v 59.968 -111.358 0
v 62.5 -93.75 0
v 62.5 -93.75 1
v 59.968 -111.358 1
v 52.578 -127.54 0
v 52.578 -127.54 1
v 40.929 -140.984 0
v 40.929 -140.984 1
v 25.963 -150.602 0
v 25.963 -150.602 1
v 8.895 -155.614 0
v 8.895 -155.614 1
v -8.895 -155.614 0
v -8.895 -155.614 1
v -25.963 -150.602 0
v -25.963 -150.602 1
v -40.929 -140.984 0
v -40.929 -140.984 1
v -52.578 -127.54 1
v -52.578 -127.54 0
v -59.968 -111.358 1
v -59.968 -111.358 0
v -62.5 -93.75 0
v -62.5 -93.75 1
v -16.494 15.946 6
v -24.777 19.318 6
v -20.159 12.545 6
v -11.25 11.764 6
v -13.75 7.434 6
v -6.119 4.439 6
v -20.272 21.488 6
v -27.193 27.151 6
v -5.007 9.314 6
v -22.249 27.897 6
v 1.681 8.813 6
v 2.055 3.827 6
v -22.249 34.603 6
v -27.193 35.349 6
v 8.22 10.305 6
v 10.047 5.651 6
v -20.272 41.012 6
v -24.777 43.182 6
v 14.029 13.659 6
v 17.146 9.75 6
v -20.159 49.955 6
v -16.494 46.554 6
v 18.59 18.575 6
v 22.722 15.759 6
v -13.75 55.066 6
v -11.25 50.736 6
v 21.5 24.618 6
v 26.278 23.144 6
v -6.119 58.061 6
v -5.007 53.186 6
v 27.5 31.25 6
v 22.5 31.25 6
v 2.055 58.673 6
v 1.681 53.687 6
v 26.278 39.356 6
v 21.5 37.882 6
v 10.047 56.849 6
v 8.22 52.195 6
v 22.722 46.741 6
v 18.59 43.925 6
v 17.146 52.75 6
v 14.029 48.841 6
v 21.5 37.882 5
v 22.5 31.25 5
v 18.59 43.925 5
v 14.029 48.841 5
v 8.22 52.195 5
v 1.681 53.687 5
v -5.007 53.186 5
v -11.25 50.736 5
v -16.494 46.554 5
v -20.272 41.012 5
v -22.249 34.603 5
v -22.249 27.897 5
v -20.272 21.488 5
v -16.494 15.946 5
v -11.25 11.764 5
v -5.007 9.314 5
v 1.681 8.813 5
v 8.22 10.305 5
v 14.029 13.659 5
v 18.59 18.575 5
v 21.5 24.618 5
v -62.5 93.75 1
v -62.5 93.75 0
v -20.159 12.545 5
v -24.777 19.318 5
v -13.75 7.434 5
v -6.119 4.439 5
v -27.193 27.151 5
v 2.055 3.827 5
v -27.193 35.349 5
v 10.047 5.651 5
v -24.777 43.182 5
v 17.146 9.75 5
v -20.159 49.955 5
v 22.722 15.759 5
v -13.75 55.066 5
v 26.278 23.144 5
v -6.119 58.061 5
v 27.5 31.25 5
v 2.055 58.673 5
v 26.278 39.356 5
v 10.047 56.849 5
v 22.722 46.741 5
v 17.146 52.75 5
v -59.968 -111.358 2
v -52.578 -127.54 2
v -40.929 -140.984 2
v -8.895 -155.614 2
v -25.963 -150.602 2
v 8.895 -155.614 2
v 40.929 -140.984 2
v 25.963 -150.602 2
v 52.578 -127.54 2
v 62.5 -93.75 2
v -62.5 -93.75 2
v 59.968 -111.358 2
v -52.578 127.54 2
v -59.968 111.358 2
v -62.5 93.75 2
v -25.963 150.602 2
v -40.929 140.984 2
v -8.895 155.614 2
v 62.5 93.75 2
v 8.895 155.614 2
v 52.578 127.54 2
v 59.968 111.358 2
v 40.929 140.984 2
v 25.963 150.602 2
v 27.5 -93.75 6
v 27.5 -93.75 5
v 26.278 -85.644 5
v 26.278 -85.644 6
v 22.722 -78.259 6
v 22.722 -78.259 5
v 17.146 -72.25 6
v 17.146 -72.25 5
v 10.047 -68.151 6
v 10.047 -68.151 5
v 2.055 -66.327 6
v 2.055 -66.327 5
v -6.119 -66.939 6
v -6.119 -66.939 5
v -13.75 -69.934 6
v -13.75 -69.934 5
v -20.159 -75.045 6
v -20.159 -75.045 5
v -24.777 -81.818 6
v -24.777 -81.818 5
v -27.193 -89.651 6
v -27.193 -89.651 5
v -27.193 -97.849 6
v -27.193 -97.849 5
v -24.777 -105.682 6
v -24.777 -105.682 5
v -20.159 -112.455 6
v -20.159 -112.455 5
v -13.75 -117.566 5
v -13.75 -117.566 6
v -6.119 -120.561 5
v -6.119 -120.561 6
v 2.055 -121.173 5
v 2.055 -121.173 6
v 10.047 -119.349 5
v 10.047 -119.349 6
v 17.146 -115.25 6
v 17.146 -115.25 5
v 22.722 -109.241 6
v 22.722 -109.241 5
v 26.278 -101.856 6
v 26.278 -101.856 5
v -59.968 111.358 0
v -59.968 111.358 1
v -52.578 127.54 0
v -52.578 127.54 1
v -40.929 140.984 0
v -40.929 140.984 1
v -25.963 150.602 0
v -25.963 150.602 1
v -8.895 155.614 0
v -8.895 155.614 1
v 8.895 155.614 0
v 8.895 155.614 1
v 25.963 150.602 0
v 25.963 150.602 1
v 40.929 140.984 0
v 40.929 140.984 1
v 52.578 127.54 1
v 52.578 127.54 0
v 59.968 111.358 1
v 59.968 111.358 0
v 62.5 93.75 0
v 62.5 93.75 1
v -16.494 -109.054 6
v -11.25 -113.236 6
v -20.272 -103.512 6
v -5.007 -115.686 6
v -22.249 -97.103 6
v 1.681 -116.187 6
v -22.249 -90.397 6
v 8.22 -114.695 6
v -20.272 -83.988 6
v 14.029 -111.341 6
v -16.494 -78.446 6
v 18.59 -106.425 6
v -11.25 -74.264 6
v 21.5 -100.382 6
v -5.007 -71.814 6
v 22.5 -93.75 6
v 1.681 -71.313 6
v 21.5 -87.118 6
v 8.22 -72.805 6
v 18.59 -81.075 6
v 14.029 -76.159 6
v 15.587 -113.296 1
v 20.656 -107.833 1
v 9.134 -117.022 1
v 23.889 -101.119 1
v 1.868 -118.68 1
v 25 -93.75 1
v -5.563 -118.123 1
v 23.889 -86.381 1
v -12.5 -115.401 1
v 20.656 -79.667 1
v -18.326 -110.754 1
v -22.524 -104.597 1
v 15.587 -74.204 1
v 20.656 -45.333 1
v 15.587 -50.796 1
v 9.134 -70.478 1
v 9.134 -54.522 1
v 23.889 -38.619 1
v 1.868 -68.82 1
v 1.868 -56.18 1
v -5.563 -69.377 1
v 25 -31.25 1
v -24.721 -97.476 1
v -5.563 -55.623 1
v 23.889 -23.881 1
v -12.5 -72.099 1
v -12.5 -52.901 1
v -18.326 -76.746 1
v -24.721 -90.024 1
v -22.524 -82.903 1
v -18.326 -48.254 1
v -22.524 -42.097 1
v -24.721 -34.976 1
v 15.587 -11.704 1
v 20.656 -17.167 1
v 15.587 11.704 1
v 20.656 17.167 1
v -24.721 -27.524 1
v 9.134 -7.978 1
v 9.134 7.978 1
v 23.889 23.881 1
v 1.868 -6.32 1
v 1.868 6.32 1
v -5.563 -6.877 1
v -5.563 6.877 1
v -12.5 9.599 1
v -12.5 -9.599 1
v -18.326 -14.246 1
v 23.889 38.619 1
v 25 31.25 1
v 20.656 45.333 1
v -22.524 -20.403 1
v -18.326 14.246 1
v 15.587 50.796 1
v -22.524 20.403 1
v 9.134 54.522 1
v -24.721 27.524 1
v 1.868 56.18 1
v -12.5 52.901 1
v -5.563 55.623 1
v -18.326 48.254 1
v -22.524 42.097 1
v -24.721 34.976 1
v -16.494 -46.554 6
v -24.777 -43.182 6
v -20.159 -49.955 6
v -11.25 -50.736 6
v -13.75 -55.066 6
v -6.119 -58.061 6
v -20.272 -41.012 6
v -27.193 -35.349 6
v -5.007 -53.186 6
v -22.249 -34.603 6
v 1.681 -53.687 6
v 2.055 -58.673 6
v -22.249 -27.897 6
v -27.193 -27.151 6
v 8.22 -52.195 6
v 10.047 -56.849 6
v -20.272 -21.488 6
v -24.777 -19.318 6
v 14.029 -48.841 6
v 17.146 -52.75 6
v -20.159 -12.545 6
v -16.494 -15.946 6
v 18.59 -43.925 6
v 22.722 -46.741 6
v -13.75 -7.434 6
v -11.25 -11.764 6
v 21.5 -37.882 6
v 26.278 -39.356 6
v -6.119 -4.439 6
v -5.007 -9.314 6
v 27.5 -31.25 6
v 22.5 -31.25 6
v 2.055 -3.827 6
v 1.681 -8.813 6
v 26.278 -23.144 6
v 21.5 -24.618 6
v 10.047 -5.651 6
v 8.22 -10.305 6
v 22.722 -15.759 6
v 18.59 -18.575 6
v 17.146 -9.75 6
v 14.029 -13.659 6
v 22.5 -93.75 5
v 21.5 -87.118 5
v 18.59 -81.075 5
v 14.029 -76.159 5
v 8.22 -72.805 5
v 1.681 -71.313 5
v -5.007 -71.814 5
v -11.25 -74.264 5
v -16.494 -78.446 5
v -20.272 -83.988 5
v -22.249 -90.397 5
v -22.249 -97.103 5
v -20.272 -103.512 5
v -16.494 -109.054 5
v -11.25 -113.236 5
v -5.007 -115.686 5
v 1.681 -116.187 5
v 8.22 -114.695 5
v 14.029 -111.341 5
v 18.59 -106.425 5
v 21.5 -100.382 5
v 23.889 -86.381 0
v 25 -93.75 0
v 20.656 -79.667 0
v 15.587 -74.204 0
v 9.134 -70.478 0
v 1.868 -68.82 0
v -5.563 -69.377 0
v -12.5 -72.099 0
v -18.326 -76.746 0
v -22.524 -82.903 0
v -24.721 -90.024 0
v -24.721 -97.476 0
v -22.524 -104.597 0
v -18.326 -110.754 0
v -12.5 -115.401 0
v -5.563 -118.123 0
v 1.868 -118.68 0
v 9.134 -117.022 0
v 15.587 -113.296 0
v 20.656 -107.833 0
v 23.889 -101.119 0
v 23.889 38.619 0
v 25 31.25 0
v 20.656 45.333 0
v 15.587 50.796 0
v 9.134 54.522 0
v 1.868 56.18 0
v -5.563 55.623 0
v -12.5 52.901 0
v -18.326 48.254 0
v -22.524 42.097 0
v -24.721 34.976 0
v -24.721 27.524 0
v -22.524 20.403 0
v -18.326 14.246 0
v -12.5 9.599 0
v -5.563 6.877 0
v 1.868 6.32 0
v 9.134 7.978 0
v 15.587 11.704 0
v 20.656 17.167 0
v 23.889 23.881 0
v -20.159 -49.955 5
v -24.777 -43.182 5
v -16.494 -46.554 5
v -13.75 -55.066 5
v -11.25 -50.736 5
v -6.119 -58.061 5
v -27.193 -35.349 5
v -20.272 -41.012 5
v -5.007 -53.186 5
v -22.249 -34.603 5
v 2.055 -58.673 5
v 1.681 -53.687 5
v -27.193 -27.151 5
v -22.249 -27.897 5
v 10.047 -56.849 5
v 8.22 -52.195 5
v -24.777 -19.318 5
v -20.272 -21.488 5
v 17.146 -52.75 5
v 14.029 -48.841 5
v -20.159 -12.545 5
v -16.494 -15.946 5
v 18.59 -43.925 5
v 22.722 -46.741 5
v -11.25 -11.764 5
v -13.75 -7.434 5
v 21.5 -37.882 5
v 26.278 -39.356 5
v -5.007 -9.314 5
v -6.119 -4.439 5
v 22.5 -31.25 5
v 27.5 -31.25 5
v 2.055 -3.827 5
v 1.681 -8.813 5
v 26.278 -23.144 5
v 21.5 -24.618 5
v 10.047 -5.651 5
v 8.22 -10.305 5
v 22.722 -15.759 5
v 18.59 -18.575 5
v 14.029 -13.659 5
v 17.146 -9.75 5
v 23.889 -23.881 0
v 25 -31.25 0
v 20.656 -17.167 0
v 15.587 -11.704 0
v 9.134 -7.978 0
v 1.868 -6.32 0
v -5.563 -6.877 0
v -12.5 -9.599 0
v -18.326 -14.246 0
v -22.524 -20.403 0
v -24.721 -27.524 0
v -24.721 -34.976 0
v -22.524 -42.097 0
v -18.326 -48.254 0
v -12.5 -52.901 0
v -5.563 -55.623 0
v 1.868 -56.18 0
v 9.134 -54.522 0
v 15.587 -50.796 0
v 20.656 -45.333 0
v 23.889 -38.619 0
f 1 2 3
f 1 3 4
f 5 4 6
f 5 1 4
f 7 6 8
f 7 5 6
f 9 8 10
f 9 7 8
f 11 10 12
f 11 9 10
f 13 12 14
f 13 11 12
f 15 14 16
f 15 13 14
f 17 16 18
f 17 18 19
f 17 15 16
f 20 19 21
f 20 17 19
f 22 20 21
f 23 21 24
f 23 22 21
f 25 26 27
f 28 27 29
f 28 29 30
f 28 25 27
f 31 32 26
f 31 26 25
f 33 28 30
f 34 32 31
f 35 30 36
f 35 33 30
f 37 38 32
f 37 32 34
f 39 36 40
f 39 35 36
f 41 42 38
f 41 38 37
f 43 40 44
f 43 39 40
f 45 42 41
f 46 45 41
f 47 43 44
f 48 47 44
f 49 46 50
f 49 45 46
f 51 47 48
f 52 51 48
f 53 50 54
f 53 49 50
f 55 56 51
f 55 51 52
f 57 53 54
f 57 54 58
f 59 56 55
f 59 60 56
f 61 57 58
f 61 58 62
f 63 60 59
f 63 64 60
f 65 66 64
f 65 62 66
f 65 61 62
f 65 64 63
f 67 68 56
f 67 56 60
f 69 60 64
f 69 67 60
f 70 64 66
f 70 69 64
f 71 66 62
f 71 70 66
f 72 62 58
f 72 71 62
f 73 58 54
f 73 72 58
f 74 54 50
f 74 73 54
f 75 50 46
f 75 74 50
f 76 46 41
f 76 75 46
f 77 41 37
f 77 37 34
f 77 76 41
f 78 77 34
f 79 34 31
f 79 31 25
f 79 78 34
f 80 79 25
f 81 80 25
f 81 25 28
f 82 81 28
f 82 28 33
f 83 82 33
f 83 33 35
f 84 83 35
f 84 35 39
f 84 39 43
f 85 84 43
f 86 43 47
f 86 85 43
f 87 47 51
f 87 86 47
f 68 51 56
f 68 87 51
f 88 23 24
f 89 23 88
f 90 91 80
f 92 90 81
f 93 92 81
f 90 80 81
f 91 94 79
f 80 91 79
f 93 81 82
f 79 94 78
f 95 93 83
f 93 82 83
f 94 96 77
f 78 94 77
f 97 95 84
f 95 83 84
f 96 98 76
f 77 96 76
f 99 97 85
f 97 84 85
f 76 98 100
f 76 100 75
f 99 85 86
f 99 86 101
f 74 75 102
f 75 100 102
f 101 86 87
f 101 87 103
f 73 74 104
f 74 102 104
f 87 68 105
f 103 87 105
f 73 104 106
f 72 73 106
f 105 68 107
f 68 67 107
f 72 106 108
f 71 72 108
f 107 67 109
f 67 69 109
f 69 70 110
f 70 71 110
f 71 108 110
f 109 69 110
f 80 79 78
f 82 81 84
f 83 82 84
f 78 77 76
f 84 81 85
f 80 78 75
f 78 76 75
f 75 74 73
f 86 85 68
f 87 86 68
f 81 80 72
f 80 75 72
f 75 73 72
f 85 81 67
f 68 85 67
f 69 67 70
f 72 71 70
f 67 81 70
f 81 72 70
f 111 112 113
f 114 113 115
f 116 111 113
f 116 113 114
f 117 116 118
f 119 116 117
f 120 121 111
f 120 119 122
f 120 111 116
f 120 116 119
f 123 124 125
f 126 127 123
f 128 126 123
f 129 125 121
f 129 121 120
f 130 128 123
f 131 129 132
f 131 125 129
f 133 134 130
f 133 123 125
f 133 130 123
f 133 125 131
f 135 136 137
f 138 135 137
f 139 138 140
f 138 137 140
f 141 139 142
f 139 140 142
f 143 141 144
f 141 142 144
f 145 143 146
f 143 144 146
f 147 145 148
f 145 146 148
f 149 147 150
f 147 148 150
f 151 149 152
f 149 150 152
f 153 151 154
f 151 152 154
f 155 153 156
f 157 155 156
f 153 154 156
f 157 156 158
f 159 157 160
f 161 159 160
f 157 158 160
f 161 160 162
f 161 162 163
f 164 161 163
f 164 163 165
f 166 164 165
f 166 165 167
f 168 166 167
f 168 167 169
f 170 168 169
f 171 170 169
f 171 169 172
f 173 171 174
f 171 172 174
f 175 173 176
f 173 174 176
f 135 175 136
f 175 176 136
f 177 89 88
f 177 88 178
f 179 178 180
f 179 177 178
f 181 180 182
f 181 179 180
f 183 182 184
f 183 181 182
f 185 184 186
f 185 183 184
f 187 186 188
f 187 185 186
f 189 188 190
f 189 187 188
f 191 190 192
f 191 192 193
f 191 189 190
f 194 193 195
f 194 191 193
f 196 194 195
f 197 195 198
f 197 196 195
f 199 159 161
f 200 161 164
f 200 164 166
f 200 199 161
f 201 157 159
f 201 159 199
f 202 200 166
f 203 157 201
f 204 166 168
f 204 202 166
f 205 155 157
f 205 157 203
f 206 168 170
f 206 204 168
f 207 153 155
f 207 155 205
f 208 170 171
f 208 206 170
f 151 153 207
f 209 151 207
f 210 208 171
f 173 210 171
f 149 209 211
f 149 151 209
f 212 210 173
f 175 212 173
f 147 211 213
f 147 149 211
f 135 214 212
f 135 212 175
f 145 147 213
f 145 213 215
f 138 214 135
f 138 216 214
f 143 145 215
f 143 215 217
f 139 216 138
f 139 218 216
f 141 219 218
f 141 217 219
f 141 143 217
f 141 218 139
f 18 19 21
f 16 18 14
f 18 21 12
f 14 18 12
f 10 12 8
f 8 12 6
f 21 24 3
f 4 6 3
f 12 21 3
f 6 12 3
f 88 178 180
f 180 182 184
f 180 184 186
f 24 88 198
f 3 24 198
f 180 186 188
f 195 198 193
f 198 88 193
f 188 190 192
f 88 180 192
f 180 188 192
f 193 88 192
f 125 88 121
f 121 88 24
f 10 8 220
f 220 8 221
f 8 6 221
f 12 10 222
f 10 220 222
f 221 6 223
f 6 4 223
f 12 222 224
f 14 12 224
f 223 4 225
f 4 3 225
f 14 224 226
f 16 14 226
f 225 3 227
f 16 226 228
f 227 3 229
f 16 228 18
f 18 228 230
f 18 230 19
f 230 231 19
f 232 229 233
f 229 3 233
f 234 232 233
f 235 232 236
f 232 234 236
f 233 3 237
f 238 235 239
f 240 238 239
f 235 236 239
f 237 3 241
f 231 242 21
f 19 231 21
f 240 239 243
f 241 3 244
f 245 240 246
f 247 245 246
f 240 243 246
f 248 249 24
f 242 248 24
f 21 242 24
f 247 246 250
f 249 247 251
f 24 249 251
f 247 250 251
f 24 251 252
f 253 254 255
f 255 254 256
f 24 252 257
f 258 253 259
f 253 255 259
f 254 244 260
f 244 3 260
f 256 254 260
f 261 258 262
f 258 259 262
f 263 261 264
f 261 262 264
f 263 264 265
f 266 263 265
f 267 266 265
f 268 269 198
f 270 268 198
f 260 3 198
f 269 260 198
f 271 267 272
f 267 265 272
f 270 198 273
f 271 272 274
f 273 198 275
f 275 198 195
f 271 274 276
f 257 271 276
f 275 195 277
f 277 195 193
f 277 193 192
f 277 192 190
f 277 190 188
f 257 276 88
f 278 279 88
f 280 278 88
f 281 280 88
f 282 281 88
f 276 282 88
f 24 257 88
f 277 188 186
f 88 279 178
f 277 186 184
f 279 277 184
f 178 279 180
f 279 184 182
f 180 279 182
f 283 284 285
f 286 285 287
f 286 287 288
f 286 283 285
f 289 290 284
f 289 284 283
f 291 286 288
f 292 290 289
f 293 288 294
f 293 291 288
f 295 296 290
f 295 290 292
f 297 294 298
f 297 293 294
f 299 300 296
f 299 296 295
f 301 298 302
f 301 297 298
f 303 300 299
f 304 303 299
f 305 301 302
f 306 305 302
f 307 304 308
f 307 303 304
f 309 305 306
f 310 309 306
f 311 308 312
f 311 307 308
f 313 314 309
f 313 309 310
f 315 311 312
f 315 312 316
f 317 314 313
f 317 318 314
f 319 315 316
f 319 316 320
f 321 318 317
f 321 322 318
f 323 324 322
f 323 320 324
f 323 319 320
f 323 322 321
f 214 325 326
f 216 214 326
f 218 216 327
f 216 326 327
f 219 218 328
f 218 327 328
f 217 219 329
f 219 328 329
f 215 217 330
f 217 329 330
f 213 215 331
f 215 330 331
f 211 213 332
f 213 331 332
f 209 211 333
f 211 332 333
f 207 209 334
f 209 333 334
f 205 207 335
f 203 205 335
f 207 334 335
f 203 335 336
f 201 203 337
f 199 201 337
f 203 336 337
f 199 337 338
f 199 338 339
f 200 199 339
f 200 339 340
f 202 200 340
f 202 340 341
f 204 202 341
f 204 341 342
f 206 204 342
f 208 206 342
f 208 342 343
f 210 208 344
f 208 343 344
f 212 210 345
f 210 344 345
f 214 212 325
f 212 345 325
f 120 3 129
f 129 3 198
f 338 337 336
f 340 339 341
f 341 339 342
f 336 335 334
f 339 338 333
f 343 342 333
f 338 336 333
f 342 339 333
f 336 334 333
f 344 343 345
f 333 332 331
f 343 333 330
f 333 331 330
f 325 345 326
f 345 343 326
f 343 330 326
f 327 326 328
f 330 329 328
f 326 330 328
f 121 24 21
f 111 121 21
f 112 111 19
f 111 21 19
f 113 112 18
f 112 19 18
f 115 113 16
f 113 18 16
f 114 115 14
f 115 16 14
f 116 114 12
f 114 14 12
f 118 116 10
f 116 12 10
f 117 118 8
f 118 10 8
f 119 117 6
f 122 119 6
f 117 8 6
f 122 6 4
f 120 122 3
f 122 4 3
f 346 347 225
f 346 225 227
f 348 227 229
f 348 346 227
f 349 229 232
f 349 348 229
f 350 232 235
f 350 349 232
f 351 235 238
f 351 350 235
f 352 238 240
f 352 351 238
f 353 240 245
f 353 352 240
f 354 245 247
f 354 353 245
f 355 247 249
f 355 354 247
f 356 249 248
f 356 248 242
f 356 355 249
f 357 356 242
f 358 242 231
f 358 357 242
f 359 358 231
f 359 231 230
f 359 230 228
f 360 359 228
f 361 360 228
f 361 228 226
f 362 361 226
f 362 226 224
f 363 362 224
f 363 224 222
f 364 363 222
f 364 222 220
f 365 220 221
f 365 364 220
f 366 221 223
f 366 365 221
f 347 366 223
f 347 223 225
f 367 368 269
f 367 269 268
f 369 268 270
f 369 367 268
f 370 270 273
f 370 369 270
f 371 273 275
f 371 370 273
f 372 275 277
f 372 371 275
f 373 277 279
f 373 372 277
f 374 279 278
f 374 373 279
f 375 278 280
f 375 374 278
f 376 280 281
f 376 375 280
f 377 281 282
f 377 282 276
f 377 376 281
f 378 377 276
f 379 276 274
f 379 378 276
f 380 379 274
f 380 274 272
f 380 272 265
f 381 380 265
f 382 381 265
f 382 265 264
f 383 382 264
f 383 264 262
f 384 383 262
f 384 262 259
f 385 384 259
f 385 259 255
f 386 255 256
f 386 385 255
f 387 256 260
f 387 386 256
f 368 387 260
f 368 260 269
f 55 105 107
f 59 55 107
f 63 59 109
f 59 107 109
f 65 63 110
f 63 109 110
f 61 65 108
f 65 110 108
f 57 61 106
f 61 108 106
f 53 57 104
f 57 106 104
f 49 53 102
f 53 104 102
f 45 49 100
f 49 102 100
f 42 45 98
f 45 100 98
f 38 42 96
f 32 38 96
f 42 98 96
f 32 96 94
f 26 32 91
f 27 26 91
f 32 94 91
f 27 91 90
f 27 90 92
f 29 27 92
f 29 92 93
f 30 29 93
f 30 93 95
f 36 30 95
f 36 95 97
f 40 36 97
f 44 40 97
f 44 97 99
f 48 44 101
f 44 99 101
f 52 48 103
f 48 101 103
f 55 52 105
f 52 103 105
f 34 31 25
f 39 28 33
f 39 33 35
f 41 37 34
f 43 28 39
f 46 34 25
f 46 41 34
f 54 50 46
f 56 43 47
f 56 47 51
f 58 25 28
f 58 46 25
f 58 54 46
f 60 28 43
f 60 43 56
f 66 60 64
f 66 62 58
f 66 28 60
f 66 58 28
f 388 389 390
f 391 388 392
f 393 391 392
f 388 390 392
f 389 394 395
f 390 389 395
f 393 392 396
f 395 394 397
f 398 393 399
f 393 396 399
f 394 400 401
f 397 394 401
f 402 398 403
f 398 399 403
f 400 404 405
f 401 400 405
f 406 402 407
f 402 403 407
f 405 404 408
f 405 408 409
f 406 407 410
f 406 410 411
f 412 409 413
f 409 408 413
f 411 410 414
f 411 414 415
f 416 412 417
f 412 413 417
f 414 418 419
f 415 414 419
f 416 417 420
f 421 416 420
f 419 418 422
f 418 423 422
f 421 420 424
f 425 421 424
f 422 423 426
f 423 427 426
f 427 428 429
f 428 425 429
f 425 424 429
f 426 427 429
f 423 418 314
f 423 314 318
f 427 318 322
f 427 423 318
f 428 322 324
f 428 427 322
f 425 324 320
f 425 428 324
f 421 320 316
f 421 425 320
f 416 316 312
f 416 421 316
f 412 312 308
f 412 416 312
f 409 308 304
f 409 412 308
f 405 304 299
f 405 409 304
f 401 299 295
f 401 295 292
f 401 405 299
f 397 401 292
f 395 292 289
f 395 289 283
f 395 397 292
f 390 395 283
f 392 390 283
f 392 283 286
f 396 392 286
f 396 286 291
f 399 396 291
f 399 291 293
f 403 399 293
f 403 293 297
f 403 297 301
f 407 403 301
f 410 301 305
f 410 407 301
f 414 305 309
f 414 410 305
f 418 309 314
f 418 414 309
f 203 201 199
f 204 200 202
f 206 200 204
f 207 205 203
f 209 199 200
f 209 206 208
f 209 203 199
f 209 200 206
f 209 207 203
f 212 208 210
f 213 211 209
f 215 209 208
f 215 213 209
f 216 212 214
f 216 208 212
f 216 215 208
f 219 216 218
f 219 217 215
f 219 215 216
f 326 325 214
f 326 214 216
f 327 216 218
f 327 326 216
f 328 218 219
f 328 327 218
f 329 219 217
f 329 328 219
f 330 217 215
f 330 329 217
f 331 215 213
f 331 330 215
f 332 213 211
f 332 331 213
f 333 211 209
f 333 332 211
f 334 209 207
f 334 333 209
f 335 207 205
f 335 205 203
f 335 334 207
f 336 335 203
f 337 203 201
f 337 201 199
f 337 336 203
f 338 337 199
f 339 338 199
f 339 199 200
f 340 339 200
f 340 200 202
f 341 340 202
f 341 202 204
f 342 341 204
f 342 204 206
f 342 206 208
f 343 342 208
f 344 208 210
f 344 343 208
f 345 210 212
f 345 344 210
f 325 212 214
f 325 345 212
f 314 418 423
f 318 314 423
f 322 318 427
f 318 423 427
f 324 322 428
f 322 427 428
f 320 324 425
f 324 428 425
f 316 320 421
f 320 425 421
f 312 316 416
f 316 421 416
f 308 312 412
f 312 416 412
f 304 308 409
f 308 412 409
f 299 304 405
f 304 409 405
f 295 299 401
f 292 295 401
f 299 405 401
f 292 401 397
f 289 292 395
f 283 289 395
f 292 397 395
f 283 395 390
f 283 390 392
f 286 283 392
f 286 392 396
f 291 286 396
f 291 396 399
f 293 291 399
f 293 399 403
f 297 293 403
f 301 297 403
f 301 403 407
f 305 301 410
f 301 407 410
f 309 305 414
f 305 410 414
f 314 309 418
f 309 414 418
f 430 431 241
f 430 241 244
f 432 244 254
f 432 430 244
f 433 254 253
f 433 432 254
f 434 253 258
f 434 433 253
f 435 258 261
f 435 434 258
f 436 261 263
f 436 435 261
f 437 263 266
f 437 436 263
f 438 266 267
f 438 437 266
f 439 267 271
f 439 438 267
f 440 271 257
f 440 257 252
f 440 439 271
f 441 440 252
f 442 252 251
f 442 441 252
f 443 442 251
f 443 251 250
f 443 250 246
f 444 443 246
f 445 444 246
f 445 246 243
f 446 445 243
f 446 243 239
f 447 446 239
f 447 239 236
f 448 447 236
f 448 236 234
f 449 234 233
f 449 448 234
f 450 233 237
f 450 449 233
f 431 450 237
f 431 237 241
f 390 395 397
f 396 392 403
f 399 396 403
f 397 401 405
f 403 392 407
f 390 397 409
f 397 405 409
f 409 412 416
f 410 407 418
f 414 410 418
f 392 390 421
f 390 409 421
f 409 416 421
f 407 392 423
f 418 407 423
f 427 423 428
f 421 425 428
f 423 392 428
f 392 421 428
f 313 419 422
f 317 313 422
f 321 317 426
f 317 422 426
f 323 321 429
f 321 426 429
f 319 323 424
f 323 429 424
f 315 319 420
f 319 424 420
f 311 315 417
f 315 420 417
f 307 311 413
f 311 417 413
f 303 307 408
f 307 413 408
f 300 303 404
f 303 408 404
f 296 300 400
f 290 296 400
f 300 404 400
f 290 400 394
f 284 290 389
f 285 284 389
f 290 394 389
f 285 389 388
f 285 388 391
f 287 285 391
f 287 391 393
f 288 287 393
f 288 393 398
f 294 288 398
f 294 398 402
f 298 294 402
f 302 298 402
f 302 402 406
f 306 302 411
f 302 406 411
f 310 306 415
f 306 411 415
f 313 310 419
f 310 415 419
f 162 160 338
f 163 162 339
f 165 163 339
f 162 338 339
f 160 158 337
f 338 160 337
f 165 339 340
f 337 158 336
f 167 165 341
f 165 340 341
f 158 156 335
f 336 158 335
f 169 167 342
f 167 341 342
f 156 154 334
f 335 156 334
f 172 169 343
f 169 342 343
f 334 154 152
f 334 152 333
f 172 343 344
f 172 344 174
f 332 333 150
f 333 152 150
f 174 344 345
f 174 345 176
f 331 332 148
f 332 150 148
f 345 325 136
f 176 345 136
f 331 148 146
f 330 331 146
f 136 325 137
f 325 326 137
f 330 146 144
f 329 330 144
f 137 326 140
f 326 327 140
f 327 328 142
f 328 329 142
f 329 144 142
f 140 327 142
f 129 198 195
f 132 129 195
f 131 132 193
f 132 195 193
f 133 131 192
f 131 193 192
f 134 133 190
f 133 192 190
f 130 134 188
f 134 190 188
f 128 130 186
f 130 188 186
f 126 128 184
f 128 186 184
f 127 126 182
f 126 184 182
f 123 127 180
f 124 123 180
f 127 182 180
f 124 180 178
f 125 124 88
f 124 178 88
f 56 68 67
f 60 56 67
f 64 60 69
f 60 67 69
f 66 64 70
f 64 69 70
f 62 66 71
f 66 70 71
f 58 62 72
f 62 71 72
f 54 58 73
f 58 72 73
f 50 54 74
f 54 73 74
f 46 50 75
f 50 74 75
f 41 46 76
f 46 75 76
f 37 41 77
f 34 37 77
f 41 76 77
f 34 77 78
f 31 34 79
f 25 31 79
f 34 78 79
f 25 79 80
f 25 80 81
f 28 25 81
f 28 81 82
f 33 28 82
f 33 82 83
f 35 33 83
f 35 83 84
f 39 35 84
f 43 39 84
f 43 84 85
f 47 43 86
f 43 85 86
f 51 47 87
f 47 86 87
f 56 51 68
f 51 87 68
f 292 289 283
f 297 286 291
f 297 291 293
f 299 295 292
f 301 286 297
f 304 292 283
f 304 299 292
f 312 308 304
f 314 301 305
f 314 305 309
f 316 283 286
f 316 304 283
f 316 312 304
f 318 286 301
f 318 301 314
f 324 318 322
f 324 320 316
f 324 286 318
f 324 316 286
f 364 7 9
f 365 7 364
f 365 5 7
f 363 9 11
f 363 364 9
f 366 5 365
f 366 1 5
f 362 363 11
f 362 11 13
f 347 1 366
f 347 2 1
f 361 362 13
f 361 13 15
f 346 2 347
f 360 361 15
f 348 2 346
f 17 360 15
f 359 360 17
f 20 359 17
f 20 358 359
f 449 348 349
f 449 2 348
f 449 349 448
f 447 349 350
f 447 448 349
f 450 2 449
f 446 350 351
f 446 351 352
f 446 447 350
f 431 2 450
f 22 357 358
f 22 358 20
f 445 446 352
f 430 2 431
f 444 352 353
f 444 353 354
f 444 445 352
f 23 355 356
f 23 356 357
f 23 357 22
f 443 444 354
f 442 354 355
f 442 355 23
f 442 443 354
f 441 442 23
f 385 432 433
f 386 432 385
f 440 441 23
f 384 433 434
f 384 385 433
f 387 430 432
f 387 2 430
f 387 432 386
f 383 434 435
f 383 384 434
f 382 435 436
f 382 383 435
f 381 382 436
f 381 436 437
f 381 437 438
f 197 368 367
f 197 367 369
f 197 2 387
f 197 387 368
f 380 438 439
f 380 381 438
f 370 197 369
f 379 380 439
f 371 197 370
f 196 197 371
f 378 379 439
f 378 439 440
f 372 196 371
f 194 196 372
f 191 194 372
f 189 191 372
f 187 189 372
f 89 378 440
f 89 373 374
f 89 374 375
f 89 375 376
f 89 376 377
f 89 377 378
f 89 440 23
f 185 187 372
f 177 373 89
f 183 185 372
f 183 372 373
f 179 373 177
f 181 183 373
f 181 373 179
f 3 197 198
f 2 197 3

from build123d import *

# Parameters (mm, degrees)
SKETCH1_R             = 25
BOSS_EXTRUDE1_DEPTH   = 1
BOSS_EXTRUDE2_START   = 5
SKETCH4_R             = 27.5
SKETCH4_R_2           = 22.5
BOSS_EXTRUDE2_DEPTH   = 1
BOSS_EXTRUDE2_2_DEPTH = 1
BOSS_EXTRUDE2_3_DEPTH = 1
BOSS_EXTRUDE3_START   = 5
SKETCH5_R             = 22.5
BOSS_EXTRUDE3_DEPTH   = 1
BOSS_EXTRUDE3_2_DEPTH = 1
BOSS_EXTRUDE3_3_DEPTH = 1
BOSS_EXTRUDE4_DEPTH   = 1


with BuildPart() as part:
    # Sketch1 → Boss-Extrude1 (new body)
    with BuildSketch(Plane.XY):
        with BuildLine():
            Line((-62.5, -93.75), (-62.5, 93.75))
            ThreePointArc((-62.5, 93.75), (0, 156.25), (62.5, 93.75))
            Line((62.5, 93.75), (62.5, -93.75))
            ThreePointArc((62.5, -93.75), (0, -156.25), (-62.5, -93.75))
        make_face()
        with Locations((0, 31.25)):
            Circle(SKETCH1_R, mode=Mode.SUBTRACT)
        with Locations((0, -31.25)):
            Circle(SKETCH1_R, mode=Mode.SUBTRACT)
        with Locations((0, -93.75)):
            Circle(SKETCH1_R, mode=Mode.SUBTRACT)
    extrude(amount=BOSS_EXTRUDE1_DEPTH)


with BuildPart() as body_2:
    # Sketch4 → Boss-Extrude2 (new body)
    with BuildSketch(Plane.XY.offset(BOSS_EXTRUDE2_START)):
        with Locations((0, 31.25)):
            Circle(SKETCH4_R)
        with Locations((0, 31.25)):
            Circle(SKETCH4_R_2, mode=Mode.SUBTRACT)
    extrude(amount=BOSS_EXTRUDE2_DEPTH)


with BuildPart() as body_3:
    # Sketch4 → Boss-Extrude2 2 (new body)
    with BuildSketch(Plane.XY.offset(BOSS_EXTRUDE2_START)):
        with Locations((0, -31.25)):
            Circle(SKETCH4_R)
        with Locations((0, -31.25)):
            Circle(SKETCH4_R_2, mode=Mode.SUBTRACT)
    extrude(amount=BOSS_EXTRUDE2_2_DEPTH)


with BuildPart() as body_4:
    # Sketch4 → Boss-Extrude2 3 (new body)
    with BuildSketch(Plane.XY.offset(BOSS_EXTRUDE2_START)):
        with Locations((0, -93.75)):
            Circle(SKETCH4_R)
        with Locations((0, -93.75)):
            Circle(SKETCH4_R_2, mode=Mode.SUBTRACT)
    extrude(amount=BOSS_EXTRUDE2_3_DEPTH)


with BuildPart() as body_5:
    # Sketch5 → Boss-Extrude3 (new body)
    with BuildSketch(Plane.XY.offset(BOSS_EXTRUDE3_START)):
        with Locations((0, -93.75)):
            Circle(SKETCH5_R)
    extrude(amount=BOSS_EXTRUDE3_DEPTH)


with BuildPart() as body_6:
    # Sketch5 → Boss-Extrude3 2 (new body)
    with BuildSketch(Plane.XY.offset(BOSS_EXTRUDE3_START)):
        with Locations((0, -31.25)):
            Circle(SKETCH5_R)
    extrude(amount=BOSS_EXTRUDE3_2_DEPTH)


with BuildPart() as body_7:
    # Sketch5 → Boss-Extrude3 3 (new body)
    with BuildSketch(Plane.XY.offset(BOSS_EXTRUDE3_START)):
        with Locations((0, 31.25)):
            Circle(SKETCH5_R)
    extrude(amount=BOSS_EXTRUDE3_3_DEPTH)


with BuildPart() as body_8:
    # Sketch6 → Boss-Extrude4 (new body)
    with BuildSketch(Plane.XY.offset(1)):
        with BuildLine():
            Line((62.5, -93.75), (62.5, 93.75))
            ThreePointArc((62.5, 93.75), (0, 156.25), (-62.5, 93.75))
            Line((-62.5, 93.75), (-62.5, -93.75))
            ThreePointArc((-62.5, -93.75), (0, -156.25), (62.5, -93.75))
        make_face()
    extrude(amount=BOSS_EXTRUDE4_DEPTH)


solid = Compound([part.part, body_2.part, body_3.part, body_4.part, body_5.part, body_6.part, body_7.part, body_8.part])
